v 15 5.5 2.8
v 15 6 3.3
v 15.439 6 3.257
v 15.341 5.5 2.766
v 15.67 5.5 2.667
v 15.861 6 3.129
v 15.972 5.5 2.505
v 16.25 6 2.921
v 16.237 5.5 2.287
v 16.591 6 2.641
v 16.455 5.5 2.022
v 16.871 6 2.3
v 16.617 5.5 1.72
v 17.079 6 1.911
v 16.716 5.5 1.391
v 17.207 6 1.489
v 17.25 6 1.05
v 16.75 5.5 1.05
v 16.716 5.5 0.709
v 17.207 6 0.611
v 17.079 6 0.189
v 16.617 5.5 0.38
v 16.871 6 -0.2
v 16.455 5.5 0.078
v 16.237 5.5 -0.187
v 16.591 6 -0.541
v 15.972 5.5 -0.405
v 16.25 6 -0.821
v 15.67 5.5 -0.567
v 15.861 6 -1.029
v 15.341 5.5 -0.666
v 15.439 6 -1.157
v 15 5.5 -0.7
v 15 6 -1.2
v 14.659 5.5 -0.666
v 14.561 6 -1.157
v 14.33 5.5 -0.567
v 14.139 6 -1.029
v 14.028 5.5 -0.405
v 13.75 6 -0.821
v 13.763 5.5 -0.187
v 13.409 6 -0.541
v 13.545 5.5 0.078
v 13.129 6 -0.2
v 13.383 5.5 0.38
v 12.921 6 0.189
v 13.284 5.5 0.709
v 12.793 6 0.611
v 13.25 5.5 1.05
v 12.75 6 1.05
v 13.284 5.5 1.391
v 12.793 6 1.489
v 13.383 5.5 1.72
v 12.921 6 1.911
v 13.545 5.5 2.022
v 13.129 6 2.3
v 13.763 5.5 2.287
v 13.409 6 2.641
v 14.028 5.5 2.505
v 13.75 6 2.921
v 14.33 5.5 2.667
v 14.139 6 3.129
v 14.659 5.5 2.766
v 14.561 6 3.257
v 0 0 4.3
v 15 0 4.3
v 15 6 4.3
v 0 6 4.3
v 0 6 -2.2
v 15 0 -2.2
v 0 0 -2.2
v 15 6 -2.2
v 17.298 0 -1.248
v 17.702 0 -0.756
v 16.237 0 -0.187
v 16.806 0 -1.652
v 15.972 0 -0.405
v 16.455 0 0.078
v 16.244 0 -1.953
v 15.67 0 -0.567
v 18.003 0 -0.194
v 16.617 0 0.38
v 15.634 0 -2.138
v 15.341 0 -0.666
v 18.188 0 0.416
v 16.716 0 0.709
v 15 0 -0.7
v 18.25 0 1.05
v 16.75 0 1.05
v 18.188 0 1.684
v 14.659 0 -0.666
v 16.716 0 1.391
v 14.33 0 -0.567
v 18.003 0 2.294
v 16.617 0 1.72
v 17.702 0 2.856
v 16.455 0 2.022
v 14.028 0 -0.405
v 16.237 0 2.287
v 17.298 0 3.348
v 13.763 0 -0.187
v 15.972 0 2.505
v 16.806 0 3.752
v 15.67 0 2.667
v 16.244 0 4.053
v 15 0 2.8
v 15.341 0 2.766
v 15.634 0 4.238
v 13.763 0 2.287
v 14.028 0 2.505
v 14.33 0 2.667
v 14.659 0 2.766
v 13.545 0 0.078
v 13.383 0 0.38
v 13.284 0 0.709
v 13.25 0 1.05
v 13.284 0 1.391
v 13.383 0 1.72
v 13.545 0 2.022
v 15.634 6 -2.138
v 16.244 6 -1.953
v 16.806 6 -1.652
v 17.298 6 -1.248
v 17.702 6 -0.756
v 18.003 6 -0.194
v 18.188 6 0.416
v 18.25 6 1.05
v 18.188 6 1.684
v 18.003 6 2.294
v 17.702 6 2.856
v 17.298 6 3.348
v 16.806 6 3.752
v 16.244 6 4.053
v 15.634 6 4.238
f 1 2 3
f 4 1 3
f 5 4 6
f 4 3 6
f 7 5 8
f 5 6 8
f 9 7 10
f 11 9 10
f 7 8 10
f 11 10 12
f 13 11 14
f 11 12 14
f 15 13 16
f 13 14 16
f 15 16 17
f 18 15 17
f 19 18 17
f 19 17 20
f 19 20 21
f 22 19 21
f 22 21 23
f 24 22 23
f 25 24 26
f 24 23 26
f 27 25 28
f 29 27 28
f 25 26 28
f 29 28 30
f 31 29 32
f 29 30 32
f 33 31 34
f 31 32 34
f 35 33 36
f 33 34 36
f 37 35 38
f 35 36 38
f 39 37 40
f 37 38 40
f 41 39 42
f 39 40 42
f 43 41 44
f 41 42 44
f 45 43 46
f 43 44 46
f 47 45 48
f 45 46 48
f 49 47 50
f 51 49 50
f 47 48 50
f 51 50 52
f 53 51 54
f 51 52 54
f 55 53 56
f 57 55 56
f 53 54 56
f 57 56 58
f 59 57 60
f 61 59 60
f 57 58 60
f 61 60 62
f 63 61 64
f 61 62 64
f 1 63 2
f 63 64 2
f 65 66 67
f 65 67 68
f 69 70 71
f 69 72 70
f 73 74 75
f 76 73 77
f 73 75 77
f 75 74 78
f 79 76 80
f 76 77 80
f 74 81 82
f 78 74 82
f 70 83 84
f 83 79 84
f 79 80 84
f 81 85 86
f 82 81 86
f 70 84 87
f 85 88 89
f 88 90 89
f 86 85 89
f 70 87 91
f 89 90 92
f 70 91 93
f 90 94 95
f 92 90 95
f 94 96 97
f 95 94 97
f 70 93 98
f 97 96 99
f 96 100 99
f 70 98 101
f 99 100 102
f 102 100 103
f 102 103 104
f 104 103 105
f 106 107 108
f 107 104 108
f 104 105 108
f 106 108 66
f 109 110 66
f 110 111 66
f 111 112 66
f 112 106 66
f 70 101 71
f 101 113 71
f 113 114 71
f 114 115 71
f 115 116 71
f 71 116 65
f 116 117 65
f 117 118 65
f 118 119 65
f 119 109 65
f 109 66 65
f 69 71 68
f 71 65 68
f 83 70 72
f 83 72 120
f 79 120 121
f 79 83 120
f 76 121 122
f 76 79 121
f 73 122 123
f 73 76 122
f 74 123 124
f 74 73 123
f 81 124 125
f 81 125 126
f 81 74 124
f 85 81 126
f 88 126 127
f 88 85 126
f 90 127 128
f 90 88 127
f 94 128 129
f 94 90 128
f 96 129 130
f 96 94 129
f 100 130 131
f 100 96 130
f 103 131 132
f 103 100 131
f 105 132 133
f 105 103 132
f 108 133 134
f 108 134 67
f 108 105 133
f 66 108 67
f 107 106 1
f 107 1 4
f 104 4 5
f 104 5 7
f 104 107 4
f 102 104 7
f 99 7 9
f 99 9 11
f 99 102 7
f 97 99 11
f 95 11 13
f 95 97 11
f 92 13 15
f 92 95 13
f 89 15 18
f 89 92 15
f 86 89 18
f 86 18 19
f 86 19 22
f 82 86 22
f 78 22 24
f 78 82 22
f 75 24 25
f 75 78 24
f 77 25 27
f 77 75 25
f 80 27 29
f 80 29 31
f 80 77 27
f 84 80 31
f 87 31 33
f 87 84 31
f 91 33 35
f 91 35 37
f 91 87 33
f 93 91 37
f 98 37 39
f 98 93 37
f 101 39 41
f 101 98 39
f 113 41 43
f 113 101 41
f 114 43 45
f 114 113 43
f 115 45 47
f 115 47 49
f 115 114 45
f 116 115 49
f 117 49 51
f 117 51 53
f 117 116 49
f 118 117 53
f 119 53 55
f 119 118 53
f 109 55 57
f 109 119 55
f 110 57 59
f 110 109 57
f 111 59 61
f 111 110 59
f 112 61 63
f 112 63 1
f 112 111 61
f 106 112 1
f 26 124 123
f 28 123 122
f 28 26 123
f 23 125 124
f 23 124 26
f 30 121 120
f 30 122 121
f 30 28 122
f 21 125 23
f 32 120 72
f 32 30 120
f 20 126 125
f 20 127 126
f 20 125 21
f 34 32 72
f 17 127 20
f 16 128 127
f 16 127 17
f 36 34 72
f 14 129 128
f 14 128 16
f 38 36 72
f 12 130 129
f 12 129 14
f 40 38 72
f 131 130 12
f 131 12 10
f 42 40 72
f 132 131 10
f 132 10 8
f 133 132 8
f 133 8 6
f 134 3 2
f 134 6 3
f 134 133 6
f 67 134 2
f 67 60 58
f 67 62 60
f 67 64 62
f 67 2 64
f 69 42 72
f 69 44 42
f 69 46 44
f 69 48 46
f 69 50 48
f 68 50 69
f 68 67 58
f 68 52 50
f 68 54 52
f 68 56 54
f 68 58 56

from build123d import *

# Parameters (mm, degrees)
SKETCH2_R           = 1.75
BOSS_EXTRUDE1_DEPTH = 6
CHAMFER1_SIZE       = 0.5
SKETCH3_W           = 11
SKETCH3_H           = 6
BOSS_EXTRUDE2_DEPTH = 2.2


with BuildPart() as part:
    # Sketch2 → Boss-Extrude1 (new body)
    with BuildSketch(Plane(origin=(0, 0, 0), x_dir=(1, 0, 0), z_dir=(0, 1, 0))):
        with BuildLine():
            Line((11, 2.2), (15, 2.2))
            ThreePointArc((15, 2.2), (18.25, -1.05), (15, -4.3))
            Line((15, -4.3), (0, -4.3))
            Line((0, -4.3), (0, 0))
            Line((0, 0), (11, 0))
            Line((11, 0), (11, 2.2))
        make_face()
        with Locations(Location((15, -1.05, 0), (0, 0, 270))):
            Circle(SKETCH2_R, mode=Mode.SUBTRACT)
    extrude(amount=BOSS_EXTRUDE1_DEPTH)

    # Chamfer1
    chamfer1_edges = [part.edges().sort_by_distance(p)[0] for p in [
        (15, 6, -0.7),
    ]]
    chamfer(chamfer1_edges, length=CHAMFER1_SIZE)

    # Sketch3 → Boss-Extrude2 (add)
    with BuildSketch(Plane(origin=(0, 0, 0), x_dir=(-1, 0, 0), z_dir=(0, 0, -1))):
        with Locations((-5.5, 3)):
            Rectangle(SKETCH3_W, SKETCH3_H)
    extrude(amount=BOSS_EXTRUDE2_DEPTH)


solid = part.part
